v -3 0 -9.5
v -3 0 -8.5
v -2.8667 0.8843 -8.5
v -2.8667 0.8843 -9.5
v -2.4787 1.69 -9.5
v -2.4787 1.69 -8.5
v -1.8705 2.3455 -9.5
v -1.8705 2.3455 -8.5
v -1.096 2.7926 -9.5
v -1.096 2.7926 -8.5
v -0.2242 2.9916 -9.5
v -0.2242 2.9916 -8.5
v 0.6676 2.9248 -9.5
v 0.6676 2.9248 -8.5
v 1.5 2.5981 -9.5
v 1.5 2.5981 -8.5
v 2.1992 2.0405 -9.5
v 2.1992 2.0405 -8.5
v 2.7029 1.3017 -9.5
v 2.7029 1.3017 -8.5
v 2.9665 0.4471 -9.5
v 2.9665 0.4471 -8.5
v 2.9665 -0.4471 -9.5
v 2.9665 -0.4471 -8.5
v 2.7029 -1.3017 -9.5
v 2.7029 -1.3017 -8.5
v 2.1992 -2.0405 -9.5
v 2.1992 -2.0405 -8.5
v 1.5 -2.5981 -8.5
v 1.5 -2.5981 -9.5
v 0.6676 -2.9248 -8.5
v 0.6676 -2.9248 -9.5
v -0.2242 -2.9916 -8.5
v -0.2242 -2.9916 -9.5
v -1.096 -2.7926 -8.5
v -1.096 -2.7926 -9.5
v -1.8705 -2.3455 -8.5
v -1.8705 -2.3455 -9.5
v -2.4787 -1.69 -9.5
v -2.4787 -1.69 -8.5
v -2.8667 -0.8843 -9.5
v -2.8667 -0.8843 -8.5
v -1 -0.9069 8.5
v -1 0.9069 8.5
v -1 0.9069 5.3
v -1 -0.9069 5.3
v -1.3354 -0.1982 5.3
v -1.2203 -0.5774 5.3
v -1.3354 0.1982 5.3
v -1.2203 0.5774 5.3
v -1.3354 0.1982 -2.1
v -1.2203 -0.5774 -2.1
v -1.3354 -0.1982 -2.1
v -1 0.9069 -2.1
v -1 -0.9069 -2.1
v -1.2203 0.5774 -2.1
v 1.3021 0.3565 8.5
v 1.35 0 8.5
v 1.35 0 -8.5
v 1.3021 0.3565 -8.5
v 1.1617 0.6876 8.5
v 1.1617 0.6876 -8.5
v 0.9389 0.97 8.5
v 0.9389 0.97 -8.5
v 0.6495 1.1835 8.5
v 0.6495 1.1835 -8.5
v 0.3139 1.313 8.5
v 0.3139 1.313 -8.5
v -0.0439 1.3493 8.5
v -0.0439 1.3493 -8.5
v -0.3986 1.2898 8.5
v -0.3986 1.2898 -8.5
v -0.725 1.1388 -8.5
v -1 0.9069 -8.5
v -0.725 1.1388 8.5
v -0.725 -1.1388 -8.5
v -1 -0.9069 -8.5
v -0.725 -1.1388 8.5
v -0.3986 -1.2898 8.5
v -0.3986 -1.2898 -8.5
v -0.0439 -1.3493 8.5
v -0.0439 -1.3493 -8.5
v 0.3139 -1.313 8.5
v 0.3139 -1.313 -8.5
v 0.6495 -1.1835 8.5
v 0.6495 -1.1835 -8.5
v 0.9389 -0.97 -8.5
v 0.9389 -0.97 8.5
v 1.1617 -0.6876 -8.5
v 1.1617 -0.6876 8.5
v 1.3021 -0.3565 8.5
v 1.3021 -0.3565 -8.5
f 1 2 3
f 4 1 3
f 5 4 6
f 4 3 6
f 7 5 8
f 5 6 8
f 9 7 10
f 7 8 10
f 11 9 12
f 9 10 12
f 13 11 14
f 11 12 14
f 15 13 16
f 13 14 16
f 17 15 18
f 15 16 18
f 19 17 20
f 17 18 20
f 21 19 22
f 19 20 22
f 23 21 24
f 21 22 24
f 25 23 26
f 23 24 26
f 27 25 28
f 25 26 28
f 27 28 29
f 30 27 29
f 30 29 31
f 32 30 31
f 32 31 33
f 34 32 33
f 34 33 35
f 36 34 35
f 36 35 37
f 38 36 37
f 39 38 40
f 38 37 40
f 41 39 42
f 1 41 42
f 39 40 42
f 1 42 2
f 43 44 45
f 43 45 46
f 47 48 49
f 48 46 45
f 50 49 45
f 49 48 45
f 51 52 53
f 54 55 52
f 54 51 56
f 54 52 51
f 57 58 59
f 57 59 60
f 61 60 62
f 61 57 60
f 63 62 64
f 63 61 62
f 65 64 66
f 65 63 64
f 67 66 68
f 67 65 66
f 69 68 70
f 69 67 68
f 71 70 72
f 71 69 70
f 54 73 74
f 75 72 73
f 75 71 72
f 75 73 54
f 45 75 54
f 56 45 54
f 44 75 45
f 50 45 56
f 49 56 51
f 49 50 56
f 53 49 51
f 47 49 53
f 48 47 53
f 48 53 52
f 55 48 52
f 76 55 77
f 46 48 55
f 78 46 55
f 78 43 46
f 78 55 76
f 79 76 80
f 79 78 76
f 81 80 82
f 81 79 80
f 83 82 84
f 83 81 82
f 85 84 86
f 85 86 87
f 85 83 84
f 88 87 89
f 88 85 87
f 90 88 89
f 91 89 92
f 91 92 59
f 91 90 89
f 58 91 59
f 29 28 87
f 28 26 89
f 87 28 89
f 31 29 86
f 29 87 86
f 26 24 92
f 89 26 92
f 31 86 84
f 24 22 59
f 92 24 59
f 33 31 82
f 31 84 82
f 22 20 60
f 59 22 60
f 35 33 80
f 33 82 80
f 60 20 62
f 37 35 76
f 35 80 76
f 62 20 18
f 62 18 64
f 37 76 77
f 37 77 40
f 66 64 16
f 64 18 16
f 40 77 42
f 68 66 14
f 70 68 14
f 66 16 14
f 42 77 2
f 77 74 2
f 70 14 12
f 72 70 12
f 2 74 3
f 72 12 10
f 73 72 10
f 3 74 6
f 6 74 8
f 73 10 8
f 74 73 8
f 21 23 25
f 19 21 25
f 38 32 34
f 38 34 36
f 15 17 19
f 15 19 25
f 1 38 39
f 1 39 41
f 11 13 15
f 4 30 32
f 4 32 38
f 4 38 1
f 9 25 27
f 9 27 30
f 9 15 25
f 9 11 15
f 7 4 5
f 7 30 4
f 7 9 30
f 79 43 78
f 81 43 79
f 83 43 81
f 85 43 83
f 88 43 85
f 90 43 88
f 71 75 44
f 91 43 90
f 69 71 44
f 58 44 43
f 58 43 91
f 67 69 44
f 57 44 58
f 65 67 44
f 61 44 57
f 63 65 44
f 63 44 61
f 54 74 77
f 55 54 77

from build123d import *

# Parameters (mm, degrees)
SKETCH2_R           = 1.35
BOSS_EXTRUDE1_DEPTH = 8.5
CUT_EXTRUDE1_DEPTH  = 6.4
CUT_EXTRUDE2_DEPTH  = 3.2
SKETCH6_R           = 3
BOSS_EXTRUDE2_DEPTH = 1


with BuildPart() as part:
    # Sketch2 → Boss-Extrude1 (new body, symmetric)
    with BuildSketch(Plane.XY):
        Circle(SKETCH2_R)
    extrude(amount=BOSS_EXTRUDE1_DEPTH, both=True)

    # Sketch4 → Cut-Extrude1 (cut)
    with BuildSketch(Plane(origin=(0, 0, -8.5), x_dir=(-1, 0, 0), z_dir=(0, 0, -1))):
        with BuildLine():
            Line((1, 0.906917857), (1, -0.906917857))
            ThreePointArc((1, -0.906917857), (1.35, 0), (1, 0.906917857))
        make_face()
    extrude(amount=-CUT_EXTRUDE1_DEPTH, mode=Mode.SUBTRACT)

    # Sketch5 → Cut-Extrude2 (cut)
    with BuildSketch(Plane.XY.offset(8.5)):
        with BuildLine():
            Line((-1, 0.906917857), (-1, -0.906917857))
            ThreePointArc((-1, -0.906917857), (-1.35, 0), (-1, 0.906917857))
        make_face()
    extrude(amount=-CUT_EXTRUDE2_DEPTH, mode=Mode.SUBTRACT)

    # Sketch6 → Boss-Extrude2 (add)
    with BuildSketch(Plane(origin=(0, 0, -8.5), x_dir=(-1, 0, 0), z_dir=(0, 0, -1))):
        Circle(SKETCH6_R)
    extrude(amount=BOSS_EXTRUDE2_DEPTH)


solid = part.part
